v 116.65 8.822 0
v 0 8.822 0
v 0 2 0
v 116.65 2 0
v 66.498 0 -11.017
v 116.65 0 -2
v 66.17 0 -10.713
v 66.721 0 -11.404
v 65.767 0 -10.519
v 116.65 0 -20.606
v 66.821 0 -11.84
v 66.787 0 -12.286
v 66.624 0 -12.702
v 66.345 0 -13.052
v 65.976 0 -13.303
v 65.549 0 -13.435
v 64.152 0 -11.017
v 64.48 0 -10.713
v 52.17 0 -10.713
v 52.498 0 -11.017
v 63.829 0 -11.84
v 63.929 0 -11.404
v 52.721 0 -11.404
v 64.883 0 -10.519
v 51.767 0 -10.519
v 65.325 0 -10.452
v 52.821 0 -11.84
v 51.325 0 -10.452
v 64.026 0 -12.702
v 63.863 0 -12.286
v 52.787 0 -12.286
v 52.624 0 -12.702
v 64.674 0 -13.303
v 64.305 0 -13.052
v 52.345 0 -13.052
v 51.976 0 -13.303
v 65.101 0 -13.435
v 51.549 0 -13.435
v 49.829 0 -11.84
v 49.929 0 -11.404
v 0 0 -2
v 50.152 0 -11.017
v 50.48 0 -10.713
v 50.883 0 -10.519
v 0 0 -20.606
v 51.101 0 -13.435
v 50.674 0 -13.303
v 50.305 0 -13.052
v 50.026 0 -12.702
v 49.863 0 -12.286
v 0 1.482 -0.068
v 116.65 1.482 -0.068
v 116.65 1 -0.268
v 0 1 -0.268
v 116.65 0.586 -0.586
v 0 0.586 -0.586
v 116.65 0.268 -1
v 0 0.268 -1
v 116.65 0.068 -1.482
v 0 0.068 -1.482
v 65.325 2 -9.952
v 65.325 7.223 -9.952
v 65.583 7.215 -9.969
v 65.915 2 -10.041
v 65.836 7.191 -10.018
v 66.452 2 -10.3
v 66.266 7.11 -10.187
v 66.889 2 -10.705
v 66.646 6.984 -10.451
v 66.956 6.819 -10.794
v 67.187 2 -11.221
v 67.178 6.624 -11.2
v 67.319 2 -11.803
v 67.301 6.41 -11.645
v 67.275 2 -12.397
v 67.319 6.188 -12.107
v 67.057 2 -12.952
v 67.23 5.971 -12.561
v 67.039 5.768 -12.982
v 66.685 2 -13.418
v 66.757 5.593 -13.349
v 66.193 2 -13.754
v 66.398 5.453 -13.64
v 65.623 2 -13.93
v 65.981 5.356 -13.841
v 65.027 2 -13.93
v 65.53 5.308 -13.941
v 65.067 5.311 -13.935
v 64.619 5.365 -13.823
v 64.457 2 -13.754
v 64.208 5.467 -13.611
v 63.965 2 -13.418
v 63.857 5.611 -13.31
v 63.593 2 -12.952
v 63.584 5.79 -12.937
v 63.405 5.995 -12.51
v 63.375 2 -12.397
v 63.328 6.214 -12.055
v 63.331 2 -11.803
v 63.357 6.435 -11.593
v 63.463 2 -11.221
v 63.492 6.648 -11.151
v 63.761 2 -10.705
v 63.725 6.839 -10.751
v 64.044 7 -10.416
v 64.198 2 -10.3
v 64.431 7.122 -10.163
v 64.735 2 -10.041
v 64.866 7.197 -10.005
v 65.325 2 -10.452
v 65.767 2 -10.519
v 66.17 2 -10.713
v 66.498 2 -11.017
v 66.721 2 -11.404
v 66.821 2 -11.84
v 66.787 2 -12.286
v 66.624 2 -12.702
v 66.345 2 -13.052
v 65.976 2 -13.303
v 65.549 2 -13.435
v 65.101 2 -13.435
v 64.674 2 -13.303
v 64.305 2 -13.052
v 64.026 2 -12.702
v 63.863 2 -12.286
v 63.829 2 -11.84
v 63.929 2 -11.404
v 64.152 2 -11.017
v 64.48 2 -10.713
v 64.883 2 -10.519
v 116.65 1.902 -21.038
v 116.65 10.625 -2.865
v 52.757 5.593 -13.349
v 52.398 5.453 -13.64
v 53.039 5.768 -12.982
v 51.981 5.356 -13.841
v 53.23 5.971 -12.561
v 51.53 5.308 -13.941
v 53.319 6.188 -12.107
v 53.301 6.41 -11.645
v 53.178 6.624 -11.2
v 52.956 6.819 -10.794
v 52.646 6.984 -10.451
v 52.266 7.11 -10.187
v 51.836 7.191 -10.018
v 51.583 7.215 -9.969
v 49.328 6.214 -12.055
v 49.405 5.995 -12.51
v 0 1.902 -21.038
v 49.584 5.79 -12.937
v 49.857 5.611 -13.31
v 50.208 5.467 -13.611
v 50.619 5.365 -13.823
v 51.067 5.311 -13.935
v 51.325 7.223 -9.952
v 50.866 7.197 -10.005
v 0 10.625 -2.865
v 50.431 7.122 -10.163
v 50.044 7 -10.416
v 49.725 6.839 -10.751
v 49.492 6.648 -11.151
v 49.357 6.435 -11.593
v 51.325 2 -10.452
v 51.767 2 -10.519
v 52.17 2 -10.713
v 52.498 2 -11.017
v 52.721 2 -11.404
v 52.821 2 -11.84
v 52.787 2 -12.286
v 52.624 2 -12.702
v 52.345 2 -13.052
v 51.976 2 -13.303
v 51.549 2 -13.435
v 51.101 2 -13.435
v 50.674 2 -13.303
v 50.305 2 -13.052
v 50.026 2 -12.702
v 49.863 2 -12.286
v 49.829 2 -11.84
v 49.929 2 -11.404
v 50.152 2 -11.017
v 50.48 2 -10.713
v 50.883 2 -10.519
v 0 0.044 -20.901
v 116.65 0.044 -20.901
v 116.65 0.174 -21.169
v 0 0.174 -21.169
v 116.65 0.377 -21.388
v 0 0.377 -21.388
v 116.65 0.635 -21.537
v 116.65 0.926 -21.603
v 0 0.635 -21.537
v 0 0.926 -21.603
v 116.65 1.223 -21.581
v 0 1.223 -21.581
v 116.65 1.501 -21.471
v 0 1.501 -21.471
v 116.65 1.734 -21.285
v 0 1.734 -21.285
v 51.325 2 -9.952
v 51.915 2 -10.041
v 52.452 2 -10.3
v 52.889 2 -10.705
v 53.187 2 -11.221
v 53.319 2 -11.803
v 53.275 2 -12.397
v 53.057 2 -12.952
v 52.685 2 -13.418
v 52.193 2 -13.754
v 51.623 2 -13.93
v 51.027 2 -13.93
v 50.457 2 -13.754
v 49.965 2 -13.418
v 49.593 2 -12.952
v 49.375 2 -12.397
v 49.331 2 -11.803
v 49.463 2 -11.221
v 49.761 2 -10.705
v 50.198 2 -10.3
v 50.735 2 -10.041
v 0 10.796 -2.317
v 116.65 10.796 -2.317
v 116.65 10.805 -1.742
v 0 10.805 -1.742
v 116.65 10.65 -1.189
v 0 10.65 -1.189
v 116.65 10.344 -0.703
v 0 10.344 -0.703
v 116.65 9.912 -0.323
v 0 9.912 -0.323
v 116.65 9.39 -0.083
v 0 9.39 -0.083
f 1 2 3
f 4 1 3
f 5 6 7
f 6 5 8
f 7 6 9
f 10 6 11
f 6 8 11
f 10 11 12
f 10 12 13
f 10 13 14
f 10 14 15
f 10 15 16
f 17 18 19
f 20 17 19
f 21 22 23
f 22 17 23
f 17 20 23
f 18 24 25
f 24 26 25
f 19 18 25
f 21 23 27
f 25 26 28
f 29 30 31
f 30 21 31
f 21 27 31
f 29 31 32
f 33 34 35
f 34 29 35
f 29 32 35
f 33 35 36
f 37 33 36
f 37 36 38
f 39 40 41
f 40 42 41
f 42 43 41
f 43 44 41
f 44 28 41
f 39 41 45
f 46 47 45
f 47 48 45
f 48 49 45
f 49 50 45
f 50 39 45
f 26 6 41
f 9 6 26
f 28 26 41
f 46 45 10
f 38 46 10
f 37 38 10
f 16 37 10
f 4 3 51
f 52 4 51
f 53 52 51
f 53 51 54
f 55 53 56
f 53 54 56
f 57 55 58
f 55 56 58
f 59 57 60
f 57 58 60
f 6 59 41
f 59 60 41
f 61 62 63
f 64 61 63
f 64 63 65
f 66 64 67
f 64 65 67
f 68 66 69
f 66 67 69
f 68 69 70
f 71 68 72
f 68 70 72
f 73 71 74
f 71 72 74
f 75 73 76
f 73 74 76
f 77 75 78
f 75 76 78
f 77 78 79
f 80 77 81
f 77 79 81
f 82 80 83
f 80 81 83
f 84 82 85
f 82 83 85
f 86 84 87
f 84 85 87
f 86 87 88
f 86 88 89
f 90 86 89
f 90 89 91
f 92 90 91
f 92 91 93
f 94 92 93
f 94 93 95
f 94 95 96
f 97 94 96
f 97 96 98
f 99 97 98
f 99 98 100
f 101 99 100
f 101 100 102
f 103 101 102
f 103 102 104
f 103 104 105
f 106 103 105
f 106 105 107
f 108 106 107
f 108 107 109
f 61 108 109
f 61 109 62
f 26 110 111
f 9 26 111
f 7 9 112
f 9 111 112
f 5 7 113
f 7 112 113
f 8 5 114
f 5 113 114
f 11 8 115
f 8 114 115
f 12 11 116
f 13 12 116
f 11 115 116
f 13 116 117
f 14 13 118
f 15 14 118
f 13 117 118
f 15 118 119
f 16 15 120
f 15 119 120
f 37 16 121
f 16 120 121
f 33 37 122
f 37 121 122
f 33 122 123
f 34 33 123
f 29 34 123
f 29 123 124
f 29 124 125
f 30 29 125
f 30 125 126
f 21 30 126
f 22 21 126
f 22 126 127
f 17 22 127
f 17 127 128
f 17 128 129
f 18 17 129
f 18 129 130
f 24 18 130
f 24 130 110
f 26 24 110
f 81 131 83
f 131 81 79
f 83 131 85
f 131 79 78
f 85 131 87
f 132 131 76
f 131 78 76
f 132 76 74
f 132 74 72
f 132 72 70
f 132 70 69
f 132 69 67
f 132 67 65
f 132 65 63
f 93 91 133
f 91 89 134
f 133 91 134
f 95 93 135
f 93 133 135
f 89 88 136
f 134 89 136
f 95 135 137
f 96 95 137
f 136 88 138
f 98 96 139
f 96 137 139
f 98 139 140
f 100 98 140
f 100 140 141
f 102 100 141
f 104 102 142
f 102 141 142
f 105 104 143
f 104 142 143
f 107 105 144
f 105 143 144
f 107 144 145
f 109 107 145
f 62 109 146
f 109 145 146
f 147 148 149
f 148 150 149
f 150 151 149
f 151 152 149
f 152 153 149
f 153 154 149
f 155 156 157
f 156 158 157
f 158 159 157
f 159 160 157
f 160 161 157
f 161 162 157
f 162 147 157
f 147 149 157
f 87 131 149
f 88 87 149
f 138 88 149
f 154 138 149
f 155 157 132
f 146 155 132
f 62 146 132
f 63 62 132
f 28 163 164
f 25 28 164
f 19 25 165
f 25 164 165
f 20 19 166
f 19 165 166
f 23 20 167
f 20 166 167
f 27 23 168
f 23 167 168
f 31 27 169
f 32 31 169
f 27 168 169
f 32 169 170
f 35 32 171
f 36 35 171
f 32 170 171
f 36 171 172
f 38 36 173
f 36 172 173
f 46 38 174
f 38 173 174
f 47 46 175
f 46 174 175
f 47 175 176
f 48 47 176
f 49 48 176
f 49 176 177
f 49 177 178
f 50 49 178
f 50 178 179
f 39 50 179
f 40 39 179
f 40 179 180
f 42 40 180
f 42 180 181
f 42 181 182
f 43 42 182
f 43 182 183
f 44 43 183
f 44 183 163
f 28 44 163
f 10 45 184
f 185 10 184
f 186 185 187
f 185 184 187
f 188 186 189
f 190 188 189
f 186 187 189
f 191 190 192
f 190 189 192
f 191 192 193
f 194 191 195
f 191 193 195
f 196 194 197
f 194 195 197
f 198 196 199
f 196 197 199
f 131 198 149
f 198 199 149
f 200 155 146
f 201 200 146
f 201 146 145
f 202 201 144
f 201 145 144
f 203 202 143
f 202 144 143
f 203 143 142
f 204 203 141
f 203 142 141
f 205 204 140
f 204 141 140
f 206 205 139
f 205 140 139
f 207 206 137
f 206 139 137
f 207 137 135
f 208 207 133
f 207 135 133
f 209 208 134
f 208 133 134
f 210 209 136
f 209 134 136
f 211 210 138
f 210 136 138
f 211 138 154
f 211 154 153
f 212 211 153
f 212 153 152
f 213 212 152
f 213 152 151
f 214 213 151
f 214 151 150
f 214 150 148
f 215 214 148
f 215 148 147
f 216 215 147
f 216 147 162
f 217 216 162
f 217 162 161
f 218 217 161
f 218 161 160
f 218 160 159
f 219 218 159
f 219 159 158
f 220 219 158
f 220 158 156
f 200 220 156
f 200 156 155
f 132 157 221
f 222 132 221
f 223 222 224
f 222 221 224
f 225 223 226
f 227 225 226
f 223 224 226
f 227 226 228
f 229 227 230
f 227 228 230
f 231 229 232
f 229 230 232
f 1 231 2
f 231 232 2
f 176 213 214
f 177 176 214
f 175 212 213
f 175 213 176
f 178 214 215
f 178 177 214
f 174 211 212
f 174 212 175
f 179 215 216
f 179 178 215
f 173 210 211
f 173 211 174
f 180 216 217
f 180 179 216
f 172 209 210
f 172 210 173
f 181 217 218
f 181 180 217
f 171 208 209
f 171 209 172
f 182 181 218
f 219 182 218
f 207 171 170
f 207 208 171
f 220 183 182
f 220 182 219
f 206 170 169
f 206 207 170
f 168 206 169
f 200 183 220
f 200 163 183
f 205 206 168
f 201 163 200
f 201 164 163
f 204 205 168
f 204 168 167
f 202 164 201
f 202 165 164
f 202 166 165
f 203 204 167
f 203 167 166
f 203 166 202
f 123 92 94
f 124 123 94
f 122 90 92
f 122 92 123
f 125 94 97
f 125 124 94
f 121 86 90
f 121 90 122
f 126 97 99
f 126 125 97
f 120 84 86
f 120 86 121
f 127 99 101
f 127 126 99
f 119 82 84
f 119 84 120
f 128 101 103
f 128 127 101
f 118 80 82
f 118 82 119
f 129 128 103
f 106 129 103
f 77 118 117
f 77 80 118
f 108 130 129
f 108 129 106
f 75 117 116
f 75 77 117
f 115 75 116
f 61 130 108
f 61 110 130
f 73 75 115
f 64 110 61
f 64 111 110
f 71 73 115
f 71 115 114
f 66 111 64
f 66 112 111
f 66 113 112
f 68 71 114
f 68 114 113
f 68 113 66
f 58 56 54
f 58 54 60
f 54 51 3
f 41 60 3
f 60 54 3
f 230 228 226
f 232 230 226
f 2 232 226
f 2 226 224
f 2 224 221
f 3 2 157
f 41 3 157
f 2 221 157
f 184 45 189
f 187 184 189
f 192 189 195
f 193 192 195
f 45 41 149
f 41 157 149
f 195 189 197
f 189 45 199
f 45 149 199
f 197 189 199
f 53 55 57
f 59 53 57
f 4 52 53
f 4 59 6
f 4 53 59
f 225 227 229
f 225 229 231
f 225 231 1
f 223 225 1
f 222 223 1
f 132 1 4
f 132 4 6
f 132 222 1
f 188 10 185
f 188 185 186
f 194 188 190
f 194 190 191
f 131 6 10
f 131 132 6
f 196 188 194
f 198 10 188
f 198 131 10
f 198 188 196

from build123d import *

# Parameters (mm, degrees)
BOSS_EXTRUDE1_DEPTH = 116.65
SKETCH2_R           = 2
CUT_EXTRUDE1_DEPTH  = 8
SKETCH3_R           = 1.5
CUT_EXTRUDE2_DEPTH  = 119.961552208


with BuildPart() as part:
    # Sketch1 → Boss-Extrude1 (new body)
    with BuildSketch(Plane(origin=(0, 0, 0), x_dir=(0, 0, -1), z_dir=(1, 0, 0))):
        with BuildLine():
            Line((2, 0), (20.605762563, 0))
            ThreePointArc((20.605762563, 0), (21.580832575, 0.778102566), (21.03849363, 1.901523057))
            Line((21.03849363, 1.901523057), (2.865462135, 10.624578175))
            ThreePointArc((2.865462135, 10.624578175), (0.934853125, 10.514299657), (0, 8.82153206))
            Line((0, 8.82153206), (0, 2))
            ThreePointArc((0, 2), (0.585786438, 0.585786438), (2, 0))
        make_face()
    extrude(amount=BOSS_EXTRUDE1_DEPTH)

    # Sketch2 → Cut-Extrude1 (cut)
    with BuildSketch(Plane(origin=(0, 10, 0), x_dir=(1, 0, 0), z_dir=(0, 1, 0))):
        with Locations(Location((51.325, 11.951977883, 0), (0, 0, 270))):
            Circle(SKETCH2_R)
        with Locations(Location((65.325, 11.951977883, 0), (0, 0, 270))):
            Circle(SKETCH2_R)
    extrude(amount=-CUT_EXTRUDE1_DEPTH, mode=Mode.SUBTRACT)

    # Sketch3 → Cut-Extrude2 (cut, through all)
    with BuildSketch(Plane(origin=(0, 2, 0), x_dir=(1, 0, 0), z_dir=(0, 1, 0))):
        with Locations(Location((51.325, 11.951977883, 0), (0, 0, 270))):
            Circle(SKETCH3_R)
        with Locations(Location((65.325, 11.951977883, 0), (0, 0, 270))):
            Circle(SKETCH3_R)
    extrude(amount=-CUT_EXTRUDE2_DEPTH, mode=Mode.SUBTRACT)


solid = part.part
